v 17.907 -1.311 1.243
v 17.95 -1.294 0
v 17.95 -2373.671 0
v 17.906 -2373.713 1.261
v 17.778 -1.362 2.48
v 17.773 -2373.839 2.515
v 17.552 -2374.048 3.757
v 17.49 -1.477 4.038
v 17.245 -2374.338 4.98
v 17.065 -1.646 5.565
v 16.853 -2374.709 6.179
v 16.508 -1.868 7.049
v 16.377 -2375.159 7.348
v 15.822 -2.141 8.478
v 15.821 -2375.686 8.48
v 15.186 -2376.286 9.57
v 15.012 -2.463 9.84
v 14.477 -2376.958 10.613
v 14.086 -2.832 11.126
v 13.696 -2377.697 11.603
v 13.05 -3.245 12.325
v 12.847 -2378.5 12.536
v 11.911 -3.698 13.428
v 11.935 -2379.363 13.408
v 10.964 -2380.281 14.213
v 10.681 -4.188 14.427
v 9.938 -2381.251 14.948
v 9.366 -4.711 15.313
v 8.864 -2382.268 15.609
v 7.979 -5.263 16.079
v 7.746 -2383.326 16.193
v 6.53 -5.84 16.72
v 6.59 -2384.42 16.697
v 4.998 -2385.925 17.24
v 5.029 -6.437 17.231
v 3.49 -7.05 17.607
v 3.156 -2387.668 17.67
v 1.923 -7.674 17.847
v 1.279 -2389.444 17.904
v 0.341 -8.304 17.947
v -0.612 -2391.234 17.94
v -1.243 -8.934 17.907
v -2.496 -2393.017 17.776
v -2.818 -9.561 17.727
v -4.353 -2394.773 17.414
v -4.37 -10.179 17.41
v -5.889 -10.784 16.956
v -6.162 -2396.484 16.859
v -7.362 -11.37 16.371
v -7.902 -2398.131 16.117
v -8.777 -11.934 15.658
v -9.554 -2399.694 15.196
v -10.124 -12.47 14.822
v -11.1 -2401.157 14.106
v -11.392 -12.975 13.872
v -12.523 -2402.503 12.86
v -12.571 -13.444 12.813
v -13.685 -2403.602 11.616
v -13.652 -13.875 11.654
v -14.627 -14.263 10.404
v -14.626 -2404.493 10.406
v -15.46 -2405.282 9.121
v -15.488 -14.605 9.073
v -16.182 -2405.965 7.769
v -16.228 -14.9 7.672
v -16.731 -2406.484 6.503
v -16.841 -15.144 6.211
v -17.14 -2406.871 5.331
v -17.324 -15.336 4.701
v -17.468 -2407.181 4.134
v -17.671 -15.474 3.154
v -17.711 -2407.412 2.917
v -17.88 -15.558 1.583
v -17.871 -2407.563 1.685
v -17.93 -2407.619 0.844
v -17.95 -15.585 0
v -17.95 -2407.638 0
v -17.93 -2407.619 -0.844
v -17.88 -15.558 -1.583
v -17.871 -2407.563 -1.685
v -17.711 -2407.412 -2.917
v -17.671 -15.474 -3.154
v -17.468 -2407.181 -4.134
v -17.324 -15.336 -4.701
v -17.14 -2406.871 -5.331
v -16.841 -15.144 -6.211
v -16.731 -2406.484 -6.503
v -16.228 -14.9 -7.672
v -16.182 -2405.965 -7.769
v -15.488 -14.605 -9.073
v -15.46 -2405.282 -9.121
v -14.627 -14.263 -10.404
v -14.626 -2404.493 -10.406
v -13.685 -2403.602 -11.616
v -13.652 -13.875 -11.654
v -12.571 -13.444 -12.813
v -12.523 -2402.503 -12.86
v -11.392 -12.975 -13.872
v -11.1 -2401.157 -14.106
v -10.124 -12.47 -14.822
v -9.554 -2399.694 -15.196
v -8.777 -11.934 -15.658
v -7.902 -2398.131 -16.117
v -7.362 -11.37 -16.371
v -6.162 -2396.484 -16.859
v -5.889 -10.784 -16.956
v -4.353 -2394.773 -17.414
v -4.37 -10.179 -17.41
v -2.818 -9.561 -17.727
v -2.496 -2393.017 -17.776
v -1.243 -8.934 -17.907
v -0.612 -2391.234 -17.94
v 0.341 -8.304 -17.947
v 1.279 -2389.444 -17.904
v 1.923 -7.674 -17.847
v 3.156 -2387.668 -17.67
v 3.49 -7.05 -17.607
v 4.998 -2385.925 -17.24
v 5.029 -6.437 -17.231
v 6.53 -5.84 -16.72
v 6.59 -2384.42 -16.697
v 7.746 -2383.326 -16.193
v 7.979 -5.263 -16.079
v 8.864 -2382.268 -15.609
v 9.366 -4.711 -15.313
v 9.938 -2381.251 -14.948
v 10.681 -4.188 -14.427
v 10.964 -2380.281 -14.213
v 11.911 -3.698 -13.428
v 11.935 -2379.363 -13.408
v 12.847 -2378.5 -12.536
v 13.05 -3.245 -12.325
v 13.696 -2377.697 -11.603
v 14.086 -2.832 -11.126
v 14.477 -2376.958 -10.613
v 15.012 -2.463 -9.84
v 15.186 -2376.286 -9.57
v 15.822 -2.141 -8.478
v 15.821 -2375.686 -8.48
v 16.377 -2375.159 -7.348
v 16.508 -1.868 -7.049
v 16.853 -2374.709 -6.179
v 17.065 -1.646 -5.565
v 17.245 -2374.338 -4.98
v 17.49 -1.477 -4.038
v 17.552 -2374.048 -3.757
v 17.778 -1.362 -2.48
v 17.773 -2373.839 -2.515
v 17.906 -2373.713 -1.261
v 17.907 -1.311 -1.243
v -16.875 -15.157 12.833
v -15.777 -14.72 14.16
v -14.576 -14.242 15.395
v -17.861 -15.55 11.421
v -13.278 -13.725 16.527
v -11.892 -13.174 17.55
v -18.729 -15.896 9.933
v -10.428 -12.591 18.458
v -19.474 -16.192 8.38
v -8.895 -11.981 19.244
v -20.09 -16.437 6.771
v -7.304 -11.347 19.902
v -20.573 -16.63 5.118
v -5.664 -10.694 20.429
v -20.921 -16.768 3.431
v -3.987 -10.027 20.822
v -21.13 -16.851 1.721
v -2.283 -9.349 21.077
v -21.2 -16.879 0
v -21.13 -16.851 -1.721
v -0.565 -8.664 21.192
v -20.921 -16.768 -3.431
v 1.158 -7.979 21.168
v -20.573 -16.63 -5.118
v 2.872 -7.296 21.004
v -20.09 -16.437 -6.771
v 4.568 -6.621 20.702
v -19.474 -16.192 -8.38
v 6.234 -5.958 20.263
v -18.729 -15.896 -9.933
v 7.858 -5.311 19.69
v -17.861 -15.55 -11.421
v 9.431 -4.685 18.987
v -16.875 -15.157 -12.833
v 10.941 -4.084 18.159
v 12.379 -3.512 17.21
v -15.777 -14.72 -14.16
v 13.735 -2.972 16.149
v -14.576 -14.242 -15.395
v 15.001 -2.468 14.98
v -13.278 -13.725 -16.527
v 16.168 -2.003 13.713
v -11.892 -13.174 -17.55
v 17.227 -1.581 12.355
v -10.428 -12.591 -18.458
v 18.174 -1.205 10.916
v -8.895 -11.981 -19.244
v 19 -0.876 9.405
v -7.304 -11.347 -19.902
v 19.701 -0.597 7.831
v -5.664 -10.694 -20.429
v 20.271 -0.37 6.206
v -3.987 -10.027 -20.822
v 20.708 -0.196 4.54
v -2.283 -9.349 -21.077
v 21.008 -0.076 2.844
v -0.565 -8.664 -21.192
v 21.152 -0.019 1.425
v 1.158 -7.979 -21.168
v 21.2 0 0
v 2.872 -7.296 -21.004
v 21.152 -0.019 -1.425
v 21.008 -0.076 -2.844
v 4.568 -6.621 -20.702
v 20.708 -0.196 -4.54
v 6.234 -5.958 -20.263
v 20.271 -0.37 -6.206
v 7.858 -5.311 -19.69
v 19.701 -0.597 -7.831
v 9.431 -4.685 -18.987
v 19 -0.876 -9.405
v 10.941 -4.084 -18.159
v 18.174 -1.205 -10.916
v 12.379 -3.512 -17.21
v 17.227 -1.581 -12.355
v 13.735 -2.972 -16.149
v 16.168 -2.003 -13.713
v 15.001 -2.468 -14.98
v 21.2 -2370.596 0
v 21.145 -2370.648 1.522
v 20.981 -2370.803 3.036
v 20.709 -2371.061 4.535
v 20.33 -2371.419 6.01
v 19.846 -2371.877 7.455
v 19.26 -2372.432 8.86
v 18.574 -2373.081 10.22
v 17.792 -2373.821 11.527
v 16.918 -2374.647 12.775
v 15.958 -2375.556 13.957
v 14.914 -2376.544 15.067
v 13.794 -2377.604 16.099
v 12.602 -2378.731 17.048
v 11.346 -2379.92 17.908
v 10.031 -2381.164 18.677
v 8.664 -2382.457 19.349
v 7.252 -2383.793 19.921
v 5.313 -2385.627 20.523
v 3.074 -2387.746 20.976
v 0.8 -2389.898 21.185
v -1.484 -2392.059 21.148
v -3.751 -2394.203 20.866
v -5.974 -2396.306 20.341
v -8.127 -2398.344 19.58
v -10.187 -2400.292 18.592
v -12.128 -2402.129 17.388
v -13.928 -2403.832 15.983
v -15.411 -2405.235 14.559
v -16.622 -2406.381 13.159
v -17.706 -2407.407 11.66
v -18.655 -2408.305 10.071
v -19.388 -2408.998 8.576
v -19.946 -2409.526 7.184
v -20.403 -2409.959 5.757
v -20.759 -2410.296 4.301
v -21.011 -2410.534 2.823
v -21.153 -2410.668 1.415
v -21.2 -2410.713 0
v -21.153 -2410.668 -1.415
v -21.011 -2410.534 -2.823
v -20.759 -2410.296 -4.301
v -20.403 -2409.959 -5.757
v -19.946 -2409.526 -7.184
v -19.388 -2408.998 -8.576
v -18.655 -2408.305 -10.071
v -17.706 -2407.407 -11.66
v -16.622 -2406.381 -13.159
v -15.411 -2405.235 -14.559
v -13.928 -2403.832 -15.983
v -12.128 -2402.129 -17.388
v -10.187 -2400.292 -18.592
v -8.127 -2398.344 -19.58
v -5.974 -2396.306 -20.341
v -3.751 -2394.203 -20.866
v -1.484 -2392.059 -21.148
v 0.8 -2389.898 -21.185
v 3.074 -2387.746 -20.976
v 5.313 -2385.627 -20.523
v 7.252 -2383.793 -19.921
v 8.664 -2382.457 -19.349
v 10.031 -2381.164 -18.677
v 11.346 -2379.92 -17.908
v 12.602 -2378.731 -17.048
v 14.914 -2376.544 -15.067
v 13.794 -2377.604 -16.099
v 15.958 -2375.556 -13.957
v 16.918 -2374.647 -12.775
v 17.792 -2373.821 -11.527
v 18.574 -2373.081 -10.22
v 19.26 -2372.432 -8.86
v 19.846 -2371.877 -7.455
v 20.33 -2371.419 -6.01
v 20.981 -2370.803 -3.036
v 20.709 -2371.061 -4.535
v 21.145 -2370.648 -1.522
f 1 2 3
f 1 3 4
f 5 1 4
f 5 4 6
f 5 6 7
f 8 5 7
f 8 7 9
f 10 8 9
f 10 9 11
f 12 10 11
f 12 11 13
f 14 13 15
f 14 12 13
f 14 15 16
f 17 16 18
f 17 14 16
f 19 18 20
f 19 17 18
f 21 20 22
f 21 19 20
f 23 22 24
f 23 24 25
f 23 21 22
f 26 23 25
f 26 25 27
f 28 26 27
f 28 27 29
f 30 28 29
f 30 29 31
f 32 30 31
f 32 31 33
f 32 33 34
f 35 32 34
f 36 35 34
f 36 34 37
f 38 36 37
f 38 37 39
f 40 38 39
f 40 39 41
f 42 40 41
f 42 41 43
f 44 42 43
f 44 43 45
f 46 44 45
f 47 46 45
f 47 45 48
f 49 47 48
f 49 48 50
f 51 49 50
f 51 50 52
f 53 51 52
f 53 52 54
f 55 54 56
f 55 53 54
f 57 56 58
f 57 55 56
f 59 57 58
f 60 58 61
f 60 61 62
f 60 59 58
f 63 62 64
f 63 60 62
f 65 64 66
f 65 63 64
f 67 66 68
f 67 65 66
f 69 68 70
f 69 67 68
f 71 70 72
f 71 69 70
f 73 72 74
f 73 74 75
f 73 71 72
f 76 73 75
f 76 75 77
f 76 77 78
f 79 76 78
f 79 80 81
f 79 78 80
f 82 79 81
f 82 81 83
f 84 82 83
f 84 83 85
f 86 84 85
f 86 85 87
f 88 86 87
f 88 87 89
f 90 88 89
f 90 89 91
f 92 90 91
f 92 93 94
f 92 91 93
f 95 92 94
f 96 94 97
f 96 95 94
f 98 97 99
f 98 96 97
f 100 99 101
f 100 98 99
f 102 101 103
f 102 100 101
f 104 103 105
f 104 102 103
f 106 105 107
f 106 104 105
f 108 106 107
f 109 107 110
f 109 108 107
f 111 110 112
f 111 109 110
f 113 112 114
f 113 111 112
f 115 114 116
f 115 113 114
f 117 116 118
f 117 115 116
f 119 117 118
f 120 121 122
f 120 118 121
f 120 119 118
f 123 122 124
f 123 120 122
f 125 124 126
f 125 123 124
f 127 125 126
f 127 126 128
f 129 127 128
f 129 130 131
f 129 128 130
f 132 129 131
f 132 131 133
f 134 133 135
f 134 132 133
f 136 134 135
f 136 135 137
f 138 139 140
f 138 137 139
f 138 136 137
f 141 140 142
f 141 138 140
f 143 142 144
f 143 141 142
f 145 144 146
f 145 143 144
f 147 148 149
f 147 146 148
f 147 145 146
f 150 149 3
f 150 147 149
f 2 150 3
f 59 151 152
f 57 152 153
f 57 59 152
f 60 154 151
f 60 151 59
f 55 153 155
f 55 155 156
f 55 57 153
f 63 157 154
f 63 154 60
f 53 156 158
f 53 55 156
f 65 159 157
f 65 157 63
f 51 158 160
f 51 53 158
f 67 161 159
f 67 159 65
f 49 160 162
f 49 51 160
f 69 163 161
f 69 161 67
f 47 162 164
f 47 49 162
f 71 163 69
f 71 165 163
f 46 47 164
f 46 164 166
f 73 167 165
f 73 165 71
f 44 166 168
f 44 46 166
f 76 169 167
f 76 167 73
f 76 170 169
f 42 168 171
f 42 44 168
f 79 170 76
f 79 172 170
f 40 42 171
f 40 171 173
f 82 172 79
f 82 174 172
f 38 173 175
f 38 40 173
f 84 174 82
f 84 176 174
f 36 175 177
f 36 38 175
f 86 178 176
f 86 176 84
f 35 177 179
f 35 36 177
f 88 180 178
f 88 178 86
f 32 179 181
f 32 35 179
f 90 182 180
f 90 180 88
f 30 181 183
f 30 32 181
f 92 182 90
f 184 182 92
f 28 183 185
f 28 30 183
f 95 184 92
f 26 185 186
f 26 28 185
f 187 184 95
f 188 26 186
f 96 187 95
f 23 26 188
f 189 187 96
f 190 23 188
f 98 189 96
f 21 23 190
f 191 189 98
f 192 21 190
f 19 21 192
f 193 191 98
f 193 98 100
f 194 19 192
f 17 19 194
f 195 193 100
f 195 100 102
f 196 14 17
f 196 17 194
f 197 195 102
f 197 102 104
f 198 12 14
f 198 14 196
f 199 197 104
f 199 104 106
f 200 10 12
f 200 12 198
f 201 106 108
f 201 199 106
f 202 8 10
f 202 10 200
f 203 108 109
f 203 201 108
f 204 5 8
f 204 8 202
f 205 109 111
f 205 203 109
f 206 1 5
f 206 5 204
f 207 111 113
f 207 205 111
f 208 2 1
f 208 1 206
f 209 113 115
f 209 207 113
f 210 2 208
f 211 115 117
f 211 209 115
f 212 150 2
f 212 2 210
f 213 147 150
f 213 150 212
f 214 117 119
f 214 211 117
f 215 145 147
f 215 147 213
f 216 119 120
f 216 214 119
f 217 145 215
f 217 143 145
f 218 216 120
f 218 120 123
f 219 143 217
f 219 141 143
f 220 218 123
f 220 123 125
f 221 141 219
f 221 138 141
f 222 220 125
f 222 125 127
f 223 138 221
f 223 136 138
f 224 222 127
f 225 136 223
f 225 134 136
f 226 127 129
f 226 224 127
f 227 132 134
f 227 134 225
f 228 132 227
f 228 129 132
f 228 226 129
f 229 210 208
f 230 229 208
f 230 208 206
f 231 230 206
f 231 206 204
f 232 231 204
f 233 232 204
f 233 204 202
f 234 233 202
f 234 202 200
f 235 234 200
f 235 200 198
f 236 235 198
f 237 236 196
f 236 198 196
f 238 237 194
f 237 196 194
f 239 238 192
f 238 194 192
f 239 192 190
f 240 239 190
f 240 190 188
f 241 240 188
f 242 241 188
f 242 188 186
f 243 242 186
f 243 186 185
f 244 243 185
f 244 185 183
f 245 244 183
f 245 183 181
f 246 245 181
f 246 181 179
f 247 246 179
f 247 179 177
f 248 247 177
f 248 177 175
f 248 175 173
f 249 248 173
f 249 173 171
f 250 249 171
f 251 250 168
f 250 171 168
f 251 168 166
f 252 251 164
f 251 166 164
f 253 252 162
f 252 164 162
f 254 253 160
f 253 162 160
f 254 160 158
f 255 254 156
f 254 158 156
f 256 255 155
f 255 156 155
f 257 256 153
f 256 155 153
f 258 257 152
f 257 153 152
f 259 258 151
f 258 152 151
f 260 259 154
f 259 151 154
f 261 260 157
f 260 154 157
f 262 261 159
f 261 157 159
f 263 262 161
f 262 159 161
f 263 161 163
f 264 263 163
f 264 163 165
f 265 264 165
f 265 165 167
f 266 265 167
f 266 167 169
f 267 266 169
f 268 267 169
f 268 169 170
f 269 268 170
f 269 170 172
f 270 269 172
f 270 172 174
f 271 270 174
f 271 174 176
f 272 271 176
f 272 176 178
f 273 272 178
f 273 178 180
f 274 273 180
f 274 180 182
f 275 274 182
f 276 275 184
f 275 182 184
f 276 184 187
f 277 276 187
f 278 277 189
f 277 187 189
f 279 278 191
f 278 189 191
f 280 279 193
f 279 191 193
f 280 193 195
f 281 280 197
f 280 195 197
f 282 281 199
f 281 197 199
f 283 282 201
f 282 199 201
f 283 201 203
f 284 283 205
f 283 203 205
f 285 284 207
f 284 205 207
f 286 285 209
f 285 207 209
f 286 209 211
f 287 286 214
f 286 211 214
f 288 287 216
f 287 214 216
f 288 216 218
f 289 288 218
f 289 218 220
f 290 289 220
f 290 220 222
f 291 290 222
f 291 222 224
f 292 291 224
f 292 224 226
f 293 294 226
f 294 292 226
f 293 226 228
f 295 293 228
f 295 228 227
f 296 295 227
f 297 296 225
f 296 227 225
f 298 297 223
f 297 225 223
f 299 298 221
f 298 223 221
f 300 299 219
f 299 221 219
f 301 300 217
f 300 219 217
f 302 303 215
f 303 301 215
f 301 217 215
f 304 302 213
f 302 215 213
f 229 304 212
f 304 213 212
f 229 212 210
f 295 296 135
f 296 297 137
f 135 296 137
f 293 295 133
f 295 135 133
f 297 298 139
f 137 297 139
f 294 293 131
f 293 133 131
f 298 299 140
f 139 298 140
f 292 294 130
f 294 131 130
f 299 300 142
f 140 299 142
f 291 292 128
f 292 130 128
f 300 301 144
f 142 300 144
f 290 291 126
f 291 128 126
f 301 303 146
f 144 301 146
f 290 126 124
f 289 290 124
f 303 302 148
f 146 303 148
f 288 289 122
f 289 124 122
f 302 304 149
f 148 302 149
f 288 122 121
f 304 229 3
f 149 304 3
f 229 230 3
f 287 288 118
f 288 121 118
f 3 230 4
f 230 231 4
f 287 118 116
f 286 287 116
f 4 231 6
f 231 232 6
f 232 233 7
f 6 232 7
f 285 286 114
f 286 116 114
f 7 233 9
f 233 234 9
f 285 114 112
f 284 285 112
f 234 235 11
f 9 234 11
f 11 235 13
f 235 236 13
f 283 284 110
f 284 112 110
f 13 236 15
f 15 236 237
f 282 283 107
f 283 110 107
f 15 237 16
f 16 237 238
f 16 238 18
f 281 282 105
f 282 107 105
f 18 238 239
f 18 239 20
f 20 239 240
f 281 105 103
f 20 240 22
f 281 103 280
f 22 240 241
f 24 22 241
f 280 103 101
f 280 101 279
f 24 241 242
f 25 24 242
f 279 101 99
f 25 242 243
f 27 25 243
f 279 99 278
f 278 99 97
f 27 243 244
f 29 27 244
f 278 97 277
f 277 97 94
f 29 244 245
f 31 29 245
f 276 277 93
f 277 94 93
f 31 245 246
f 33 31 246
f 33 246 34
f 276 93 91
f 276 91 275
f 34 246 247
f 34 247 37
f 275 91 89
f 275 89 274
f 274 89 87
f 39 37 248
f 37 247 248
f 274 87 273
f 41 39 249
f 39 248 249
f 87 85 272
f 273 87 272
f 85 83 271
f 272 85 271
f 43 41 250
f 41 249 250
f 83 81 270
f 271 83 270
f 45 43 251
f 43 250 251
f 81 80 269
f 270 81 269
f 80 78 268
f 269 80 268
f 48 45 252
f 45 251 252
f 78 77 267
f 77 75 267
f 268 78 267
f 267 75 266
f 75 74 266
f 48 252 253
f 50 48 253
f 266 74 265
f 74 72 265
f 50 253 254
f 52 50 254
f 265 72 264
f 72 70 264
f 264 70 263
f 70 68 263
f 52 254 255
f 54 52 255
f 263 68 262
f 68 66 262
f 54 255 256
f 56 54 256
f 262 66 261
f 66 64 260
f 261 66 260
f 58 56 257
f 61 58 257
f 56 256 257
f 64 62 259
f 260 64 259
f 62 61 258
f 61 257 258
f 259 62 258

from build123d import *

# Parameters (mm, degrees)
F0_R          = 21.2
F0_R_2        = 17.95
F1_DEPTH      = 2500
F3_DEPTH      = 21.201
F3_DEPTH_BACK = 21.201
F5_DEPTH      = 21.201
F5_DEPTH_BACK = 21.201


with BuildPart() as f1:
    # F0 (on Front) → F1 (new body)
    with BuildSketch(Plane.XZ):
        Circle(F0_R)
        Circle(F0_R_2, mode=Mode.SUBTRACT)
    extrude(amount=F1_DEPTH)

    # F2 (on Top) → F3 (cut, two sides)
    with BuildSketch(Plane.XY) as f3_sk:
        Polygon((-21.2, 0), (-21.2, -16.8792704184), (21.2, 0), align=None)
    extrude(amount=-F3_DEPTH, mode=Mode.SUBTRACT)
    extrude(f3_sk.sketch, amount=F3_DEPTH_BACK, mode=Mode.SUBTRACT)

    # F4 (on Top) → F5 (cut, two sides)
    with BuildSketch(Plane.XY) as f5_sk:
        Polygon((21.2, -2500), (21.2, -2370.596422726), (-21.2, -2410.7125909795), (-21.2, -2500), align=None)
    extrude(amount=-F5_DEPTH, mode=Mode.SUBTRACT)
    extrude(f5_sk.sketch, amount=F5_DEPTH_BACK, mode=Mode.SUBTRACT)


solid = f1.part
